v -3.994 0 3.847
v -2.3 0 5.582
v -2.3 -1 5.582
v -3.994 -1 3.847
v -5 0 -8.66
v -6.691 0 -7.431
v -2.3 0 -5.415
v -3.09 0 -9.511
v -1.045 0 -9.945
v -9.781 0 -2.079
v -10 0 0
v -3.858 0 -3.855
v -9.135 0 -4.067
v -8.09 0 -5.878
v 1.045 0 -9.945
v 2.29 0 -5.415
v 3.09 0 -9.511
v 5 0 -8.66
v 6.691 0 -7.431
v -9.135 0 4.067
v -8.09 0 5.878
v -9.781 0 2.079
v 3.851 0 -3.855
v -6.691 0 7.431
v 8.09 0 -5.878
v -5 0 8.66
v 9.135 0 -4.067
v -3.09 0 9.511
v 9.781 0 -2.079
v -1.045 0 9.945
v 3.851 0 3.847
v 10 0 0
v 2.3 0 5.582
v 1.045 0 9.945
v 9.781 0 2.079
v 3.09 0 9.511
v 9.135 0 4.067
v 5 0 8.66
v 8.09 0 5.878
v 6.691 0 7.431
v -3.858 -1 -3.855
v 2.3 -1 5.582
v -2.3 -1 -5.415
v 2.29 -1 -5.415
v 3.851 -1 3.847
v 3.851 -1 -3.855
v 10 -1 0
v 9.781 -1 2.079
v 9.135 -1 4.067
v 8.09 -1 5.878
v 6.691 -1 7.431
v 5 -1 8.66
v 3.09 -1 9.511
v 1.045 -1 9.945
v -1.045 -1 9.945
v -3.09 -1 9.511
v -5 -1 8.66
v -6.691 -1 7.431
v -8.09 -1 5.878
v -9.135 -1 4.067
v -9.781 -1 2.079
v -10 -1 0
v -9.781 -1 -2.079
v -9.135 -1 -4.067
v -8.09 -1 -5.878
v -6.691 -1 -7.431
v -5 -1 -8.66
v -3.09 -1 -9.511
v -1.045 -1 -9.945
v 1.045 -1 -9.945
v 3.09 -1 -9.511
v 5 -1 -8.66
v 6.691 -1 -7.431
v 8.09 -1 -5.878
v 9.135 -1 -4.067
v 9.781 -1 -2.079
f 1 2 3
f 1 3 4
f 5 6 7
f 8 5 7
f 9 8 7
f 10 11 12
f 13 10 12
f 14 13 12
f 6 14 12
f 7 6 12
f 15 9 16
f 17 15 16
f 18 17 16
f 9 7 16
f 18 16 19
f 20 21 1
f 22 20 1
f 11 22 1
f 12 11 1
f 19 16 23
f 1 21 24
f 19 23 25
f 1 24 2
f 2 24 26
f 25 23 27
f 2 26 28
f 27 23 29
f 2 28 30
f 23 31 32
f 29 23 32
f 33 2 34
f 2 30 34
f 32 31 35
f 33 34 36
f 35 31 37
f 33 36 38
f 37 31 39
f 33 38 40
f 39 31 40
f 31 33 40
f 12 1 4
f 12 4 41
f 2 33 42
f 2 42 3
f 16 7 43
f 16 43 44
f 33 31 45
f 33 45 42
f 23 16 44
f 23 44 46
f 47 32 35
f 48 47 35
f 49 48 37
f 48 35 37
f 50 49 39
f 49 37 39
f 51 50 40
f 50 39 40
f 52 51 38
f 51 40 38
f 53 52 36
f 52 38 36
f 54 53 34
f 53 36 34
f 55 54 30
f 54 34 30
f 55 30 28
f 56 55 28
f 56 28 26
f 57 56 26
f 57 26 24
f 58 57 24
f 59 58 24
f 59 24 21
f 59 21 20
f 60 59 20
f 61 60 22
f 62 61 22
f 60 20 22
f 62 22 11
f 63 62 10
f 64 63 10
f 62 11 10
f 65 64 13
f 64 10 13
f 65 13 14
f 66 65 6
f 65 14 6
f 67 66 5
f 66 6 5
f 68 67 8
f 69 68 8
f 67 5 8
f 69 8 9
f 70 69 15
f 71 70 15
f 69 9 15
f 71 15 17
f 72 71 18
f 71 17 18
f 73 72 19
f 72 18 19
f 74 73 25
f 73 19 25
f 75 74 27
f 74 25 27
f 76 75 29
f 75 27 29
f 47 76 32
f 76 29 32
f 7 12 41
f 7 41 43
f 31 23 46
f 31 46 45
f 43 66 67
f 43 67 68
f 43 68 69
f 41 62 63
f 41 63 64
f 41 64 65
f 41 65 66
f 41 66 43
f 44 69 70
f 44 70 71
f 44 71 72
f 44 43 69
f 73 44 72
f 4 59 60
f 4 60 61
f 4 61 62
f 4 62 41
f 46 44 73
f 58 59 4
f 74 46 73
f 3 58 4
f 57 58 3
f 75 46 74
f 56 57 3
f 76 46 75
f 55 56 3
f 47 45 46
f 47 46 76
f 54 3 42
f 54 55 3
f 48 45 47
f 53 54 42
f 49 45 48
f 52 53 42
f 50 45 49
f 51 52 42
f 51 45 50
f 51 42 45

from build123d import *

# Parameters (mm, degrees)
F0_R     = 10
F1_DEPTH = 1
F3_DEPTH = 0.7
F4_DEPTH = 1


with BuildPart() as f1:
    # F0 (on Front) → F1 (new body)
    with BuildSketch(Plane.XZ):
        Circle(F0_R)
    extrude(amount=F1_DEPTH)

    # F2 (on Front) → F3 (cut)
    with BuildSketch(Plane.XZ):
        Polygon((2.3, 5.581941), (0, 5.581941), (-2.3, 5.581941), (-3.99405, 3.847297), (-3.858357, -3.854667), (-2.3, -5.414516), (2.289638, -5.414516), (3.85098, -3.854667), (3.85098, 3.847297), align=None)
    extrude(amount=-F3_DEPTH, mode=Mode.SUBTRACT)

    # F2 (on Front) → F4 (cut)
    with BuildSketch(Plane.XZ):
        Polygon((2.3, 5.581941), (0, 5.581941), (-2.3, 5.581941), (-3.99405, 3.847297), (-3.858357, -3.854667), (-2.3, -5.414516), (2.289638, -5.414516), (3.85098, -3.854667), (3.85098, 3.847297), align=None)
    extrude(amount=F4_DEPTH, mode=Mode.SUBTRACT)


solid = f1.part
